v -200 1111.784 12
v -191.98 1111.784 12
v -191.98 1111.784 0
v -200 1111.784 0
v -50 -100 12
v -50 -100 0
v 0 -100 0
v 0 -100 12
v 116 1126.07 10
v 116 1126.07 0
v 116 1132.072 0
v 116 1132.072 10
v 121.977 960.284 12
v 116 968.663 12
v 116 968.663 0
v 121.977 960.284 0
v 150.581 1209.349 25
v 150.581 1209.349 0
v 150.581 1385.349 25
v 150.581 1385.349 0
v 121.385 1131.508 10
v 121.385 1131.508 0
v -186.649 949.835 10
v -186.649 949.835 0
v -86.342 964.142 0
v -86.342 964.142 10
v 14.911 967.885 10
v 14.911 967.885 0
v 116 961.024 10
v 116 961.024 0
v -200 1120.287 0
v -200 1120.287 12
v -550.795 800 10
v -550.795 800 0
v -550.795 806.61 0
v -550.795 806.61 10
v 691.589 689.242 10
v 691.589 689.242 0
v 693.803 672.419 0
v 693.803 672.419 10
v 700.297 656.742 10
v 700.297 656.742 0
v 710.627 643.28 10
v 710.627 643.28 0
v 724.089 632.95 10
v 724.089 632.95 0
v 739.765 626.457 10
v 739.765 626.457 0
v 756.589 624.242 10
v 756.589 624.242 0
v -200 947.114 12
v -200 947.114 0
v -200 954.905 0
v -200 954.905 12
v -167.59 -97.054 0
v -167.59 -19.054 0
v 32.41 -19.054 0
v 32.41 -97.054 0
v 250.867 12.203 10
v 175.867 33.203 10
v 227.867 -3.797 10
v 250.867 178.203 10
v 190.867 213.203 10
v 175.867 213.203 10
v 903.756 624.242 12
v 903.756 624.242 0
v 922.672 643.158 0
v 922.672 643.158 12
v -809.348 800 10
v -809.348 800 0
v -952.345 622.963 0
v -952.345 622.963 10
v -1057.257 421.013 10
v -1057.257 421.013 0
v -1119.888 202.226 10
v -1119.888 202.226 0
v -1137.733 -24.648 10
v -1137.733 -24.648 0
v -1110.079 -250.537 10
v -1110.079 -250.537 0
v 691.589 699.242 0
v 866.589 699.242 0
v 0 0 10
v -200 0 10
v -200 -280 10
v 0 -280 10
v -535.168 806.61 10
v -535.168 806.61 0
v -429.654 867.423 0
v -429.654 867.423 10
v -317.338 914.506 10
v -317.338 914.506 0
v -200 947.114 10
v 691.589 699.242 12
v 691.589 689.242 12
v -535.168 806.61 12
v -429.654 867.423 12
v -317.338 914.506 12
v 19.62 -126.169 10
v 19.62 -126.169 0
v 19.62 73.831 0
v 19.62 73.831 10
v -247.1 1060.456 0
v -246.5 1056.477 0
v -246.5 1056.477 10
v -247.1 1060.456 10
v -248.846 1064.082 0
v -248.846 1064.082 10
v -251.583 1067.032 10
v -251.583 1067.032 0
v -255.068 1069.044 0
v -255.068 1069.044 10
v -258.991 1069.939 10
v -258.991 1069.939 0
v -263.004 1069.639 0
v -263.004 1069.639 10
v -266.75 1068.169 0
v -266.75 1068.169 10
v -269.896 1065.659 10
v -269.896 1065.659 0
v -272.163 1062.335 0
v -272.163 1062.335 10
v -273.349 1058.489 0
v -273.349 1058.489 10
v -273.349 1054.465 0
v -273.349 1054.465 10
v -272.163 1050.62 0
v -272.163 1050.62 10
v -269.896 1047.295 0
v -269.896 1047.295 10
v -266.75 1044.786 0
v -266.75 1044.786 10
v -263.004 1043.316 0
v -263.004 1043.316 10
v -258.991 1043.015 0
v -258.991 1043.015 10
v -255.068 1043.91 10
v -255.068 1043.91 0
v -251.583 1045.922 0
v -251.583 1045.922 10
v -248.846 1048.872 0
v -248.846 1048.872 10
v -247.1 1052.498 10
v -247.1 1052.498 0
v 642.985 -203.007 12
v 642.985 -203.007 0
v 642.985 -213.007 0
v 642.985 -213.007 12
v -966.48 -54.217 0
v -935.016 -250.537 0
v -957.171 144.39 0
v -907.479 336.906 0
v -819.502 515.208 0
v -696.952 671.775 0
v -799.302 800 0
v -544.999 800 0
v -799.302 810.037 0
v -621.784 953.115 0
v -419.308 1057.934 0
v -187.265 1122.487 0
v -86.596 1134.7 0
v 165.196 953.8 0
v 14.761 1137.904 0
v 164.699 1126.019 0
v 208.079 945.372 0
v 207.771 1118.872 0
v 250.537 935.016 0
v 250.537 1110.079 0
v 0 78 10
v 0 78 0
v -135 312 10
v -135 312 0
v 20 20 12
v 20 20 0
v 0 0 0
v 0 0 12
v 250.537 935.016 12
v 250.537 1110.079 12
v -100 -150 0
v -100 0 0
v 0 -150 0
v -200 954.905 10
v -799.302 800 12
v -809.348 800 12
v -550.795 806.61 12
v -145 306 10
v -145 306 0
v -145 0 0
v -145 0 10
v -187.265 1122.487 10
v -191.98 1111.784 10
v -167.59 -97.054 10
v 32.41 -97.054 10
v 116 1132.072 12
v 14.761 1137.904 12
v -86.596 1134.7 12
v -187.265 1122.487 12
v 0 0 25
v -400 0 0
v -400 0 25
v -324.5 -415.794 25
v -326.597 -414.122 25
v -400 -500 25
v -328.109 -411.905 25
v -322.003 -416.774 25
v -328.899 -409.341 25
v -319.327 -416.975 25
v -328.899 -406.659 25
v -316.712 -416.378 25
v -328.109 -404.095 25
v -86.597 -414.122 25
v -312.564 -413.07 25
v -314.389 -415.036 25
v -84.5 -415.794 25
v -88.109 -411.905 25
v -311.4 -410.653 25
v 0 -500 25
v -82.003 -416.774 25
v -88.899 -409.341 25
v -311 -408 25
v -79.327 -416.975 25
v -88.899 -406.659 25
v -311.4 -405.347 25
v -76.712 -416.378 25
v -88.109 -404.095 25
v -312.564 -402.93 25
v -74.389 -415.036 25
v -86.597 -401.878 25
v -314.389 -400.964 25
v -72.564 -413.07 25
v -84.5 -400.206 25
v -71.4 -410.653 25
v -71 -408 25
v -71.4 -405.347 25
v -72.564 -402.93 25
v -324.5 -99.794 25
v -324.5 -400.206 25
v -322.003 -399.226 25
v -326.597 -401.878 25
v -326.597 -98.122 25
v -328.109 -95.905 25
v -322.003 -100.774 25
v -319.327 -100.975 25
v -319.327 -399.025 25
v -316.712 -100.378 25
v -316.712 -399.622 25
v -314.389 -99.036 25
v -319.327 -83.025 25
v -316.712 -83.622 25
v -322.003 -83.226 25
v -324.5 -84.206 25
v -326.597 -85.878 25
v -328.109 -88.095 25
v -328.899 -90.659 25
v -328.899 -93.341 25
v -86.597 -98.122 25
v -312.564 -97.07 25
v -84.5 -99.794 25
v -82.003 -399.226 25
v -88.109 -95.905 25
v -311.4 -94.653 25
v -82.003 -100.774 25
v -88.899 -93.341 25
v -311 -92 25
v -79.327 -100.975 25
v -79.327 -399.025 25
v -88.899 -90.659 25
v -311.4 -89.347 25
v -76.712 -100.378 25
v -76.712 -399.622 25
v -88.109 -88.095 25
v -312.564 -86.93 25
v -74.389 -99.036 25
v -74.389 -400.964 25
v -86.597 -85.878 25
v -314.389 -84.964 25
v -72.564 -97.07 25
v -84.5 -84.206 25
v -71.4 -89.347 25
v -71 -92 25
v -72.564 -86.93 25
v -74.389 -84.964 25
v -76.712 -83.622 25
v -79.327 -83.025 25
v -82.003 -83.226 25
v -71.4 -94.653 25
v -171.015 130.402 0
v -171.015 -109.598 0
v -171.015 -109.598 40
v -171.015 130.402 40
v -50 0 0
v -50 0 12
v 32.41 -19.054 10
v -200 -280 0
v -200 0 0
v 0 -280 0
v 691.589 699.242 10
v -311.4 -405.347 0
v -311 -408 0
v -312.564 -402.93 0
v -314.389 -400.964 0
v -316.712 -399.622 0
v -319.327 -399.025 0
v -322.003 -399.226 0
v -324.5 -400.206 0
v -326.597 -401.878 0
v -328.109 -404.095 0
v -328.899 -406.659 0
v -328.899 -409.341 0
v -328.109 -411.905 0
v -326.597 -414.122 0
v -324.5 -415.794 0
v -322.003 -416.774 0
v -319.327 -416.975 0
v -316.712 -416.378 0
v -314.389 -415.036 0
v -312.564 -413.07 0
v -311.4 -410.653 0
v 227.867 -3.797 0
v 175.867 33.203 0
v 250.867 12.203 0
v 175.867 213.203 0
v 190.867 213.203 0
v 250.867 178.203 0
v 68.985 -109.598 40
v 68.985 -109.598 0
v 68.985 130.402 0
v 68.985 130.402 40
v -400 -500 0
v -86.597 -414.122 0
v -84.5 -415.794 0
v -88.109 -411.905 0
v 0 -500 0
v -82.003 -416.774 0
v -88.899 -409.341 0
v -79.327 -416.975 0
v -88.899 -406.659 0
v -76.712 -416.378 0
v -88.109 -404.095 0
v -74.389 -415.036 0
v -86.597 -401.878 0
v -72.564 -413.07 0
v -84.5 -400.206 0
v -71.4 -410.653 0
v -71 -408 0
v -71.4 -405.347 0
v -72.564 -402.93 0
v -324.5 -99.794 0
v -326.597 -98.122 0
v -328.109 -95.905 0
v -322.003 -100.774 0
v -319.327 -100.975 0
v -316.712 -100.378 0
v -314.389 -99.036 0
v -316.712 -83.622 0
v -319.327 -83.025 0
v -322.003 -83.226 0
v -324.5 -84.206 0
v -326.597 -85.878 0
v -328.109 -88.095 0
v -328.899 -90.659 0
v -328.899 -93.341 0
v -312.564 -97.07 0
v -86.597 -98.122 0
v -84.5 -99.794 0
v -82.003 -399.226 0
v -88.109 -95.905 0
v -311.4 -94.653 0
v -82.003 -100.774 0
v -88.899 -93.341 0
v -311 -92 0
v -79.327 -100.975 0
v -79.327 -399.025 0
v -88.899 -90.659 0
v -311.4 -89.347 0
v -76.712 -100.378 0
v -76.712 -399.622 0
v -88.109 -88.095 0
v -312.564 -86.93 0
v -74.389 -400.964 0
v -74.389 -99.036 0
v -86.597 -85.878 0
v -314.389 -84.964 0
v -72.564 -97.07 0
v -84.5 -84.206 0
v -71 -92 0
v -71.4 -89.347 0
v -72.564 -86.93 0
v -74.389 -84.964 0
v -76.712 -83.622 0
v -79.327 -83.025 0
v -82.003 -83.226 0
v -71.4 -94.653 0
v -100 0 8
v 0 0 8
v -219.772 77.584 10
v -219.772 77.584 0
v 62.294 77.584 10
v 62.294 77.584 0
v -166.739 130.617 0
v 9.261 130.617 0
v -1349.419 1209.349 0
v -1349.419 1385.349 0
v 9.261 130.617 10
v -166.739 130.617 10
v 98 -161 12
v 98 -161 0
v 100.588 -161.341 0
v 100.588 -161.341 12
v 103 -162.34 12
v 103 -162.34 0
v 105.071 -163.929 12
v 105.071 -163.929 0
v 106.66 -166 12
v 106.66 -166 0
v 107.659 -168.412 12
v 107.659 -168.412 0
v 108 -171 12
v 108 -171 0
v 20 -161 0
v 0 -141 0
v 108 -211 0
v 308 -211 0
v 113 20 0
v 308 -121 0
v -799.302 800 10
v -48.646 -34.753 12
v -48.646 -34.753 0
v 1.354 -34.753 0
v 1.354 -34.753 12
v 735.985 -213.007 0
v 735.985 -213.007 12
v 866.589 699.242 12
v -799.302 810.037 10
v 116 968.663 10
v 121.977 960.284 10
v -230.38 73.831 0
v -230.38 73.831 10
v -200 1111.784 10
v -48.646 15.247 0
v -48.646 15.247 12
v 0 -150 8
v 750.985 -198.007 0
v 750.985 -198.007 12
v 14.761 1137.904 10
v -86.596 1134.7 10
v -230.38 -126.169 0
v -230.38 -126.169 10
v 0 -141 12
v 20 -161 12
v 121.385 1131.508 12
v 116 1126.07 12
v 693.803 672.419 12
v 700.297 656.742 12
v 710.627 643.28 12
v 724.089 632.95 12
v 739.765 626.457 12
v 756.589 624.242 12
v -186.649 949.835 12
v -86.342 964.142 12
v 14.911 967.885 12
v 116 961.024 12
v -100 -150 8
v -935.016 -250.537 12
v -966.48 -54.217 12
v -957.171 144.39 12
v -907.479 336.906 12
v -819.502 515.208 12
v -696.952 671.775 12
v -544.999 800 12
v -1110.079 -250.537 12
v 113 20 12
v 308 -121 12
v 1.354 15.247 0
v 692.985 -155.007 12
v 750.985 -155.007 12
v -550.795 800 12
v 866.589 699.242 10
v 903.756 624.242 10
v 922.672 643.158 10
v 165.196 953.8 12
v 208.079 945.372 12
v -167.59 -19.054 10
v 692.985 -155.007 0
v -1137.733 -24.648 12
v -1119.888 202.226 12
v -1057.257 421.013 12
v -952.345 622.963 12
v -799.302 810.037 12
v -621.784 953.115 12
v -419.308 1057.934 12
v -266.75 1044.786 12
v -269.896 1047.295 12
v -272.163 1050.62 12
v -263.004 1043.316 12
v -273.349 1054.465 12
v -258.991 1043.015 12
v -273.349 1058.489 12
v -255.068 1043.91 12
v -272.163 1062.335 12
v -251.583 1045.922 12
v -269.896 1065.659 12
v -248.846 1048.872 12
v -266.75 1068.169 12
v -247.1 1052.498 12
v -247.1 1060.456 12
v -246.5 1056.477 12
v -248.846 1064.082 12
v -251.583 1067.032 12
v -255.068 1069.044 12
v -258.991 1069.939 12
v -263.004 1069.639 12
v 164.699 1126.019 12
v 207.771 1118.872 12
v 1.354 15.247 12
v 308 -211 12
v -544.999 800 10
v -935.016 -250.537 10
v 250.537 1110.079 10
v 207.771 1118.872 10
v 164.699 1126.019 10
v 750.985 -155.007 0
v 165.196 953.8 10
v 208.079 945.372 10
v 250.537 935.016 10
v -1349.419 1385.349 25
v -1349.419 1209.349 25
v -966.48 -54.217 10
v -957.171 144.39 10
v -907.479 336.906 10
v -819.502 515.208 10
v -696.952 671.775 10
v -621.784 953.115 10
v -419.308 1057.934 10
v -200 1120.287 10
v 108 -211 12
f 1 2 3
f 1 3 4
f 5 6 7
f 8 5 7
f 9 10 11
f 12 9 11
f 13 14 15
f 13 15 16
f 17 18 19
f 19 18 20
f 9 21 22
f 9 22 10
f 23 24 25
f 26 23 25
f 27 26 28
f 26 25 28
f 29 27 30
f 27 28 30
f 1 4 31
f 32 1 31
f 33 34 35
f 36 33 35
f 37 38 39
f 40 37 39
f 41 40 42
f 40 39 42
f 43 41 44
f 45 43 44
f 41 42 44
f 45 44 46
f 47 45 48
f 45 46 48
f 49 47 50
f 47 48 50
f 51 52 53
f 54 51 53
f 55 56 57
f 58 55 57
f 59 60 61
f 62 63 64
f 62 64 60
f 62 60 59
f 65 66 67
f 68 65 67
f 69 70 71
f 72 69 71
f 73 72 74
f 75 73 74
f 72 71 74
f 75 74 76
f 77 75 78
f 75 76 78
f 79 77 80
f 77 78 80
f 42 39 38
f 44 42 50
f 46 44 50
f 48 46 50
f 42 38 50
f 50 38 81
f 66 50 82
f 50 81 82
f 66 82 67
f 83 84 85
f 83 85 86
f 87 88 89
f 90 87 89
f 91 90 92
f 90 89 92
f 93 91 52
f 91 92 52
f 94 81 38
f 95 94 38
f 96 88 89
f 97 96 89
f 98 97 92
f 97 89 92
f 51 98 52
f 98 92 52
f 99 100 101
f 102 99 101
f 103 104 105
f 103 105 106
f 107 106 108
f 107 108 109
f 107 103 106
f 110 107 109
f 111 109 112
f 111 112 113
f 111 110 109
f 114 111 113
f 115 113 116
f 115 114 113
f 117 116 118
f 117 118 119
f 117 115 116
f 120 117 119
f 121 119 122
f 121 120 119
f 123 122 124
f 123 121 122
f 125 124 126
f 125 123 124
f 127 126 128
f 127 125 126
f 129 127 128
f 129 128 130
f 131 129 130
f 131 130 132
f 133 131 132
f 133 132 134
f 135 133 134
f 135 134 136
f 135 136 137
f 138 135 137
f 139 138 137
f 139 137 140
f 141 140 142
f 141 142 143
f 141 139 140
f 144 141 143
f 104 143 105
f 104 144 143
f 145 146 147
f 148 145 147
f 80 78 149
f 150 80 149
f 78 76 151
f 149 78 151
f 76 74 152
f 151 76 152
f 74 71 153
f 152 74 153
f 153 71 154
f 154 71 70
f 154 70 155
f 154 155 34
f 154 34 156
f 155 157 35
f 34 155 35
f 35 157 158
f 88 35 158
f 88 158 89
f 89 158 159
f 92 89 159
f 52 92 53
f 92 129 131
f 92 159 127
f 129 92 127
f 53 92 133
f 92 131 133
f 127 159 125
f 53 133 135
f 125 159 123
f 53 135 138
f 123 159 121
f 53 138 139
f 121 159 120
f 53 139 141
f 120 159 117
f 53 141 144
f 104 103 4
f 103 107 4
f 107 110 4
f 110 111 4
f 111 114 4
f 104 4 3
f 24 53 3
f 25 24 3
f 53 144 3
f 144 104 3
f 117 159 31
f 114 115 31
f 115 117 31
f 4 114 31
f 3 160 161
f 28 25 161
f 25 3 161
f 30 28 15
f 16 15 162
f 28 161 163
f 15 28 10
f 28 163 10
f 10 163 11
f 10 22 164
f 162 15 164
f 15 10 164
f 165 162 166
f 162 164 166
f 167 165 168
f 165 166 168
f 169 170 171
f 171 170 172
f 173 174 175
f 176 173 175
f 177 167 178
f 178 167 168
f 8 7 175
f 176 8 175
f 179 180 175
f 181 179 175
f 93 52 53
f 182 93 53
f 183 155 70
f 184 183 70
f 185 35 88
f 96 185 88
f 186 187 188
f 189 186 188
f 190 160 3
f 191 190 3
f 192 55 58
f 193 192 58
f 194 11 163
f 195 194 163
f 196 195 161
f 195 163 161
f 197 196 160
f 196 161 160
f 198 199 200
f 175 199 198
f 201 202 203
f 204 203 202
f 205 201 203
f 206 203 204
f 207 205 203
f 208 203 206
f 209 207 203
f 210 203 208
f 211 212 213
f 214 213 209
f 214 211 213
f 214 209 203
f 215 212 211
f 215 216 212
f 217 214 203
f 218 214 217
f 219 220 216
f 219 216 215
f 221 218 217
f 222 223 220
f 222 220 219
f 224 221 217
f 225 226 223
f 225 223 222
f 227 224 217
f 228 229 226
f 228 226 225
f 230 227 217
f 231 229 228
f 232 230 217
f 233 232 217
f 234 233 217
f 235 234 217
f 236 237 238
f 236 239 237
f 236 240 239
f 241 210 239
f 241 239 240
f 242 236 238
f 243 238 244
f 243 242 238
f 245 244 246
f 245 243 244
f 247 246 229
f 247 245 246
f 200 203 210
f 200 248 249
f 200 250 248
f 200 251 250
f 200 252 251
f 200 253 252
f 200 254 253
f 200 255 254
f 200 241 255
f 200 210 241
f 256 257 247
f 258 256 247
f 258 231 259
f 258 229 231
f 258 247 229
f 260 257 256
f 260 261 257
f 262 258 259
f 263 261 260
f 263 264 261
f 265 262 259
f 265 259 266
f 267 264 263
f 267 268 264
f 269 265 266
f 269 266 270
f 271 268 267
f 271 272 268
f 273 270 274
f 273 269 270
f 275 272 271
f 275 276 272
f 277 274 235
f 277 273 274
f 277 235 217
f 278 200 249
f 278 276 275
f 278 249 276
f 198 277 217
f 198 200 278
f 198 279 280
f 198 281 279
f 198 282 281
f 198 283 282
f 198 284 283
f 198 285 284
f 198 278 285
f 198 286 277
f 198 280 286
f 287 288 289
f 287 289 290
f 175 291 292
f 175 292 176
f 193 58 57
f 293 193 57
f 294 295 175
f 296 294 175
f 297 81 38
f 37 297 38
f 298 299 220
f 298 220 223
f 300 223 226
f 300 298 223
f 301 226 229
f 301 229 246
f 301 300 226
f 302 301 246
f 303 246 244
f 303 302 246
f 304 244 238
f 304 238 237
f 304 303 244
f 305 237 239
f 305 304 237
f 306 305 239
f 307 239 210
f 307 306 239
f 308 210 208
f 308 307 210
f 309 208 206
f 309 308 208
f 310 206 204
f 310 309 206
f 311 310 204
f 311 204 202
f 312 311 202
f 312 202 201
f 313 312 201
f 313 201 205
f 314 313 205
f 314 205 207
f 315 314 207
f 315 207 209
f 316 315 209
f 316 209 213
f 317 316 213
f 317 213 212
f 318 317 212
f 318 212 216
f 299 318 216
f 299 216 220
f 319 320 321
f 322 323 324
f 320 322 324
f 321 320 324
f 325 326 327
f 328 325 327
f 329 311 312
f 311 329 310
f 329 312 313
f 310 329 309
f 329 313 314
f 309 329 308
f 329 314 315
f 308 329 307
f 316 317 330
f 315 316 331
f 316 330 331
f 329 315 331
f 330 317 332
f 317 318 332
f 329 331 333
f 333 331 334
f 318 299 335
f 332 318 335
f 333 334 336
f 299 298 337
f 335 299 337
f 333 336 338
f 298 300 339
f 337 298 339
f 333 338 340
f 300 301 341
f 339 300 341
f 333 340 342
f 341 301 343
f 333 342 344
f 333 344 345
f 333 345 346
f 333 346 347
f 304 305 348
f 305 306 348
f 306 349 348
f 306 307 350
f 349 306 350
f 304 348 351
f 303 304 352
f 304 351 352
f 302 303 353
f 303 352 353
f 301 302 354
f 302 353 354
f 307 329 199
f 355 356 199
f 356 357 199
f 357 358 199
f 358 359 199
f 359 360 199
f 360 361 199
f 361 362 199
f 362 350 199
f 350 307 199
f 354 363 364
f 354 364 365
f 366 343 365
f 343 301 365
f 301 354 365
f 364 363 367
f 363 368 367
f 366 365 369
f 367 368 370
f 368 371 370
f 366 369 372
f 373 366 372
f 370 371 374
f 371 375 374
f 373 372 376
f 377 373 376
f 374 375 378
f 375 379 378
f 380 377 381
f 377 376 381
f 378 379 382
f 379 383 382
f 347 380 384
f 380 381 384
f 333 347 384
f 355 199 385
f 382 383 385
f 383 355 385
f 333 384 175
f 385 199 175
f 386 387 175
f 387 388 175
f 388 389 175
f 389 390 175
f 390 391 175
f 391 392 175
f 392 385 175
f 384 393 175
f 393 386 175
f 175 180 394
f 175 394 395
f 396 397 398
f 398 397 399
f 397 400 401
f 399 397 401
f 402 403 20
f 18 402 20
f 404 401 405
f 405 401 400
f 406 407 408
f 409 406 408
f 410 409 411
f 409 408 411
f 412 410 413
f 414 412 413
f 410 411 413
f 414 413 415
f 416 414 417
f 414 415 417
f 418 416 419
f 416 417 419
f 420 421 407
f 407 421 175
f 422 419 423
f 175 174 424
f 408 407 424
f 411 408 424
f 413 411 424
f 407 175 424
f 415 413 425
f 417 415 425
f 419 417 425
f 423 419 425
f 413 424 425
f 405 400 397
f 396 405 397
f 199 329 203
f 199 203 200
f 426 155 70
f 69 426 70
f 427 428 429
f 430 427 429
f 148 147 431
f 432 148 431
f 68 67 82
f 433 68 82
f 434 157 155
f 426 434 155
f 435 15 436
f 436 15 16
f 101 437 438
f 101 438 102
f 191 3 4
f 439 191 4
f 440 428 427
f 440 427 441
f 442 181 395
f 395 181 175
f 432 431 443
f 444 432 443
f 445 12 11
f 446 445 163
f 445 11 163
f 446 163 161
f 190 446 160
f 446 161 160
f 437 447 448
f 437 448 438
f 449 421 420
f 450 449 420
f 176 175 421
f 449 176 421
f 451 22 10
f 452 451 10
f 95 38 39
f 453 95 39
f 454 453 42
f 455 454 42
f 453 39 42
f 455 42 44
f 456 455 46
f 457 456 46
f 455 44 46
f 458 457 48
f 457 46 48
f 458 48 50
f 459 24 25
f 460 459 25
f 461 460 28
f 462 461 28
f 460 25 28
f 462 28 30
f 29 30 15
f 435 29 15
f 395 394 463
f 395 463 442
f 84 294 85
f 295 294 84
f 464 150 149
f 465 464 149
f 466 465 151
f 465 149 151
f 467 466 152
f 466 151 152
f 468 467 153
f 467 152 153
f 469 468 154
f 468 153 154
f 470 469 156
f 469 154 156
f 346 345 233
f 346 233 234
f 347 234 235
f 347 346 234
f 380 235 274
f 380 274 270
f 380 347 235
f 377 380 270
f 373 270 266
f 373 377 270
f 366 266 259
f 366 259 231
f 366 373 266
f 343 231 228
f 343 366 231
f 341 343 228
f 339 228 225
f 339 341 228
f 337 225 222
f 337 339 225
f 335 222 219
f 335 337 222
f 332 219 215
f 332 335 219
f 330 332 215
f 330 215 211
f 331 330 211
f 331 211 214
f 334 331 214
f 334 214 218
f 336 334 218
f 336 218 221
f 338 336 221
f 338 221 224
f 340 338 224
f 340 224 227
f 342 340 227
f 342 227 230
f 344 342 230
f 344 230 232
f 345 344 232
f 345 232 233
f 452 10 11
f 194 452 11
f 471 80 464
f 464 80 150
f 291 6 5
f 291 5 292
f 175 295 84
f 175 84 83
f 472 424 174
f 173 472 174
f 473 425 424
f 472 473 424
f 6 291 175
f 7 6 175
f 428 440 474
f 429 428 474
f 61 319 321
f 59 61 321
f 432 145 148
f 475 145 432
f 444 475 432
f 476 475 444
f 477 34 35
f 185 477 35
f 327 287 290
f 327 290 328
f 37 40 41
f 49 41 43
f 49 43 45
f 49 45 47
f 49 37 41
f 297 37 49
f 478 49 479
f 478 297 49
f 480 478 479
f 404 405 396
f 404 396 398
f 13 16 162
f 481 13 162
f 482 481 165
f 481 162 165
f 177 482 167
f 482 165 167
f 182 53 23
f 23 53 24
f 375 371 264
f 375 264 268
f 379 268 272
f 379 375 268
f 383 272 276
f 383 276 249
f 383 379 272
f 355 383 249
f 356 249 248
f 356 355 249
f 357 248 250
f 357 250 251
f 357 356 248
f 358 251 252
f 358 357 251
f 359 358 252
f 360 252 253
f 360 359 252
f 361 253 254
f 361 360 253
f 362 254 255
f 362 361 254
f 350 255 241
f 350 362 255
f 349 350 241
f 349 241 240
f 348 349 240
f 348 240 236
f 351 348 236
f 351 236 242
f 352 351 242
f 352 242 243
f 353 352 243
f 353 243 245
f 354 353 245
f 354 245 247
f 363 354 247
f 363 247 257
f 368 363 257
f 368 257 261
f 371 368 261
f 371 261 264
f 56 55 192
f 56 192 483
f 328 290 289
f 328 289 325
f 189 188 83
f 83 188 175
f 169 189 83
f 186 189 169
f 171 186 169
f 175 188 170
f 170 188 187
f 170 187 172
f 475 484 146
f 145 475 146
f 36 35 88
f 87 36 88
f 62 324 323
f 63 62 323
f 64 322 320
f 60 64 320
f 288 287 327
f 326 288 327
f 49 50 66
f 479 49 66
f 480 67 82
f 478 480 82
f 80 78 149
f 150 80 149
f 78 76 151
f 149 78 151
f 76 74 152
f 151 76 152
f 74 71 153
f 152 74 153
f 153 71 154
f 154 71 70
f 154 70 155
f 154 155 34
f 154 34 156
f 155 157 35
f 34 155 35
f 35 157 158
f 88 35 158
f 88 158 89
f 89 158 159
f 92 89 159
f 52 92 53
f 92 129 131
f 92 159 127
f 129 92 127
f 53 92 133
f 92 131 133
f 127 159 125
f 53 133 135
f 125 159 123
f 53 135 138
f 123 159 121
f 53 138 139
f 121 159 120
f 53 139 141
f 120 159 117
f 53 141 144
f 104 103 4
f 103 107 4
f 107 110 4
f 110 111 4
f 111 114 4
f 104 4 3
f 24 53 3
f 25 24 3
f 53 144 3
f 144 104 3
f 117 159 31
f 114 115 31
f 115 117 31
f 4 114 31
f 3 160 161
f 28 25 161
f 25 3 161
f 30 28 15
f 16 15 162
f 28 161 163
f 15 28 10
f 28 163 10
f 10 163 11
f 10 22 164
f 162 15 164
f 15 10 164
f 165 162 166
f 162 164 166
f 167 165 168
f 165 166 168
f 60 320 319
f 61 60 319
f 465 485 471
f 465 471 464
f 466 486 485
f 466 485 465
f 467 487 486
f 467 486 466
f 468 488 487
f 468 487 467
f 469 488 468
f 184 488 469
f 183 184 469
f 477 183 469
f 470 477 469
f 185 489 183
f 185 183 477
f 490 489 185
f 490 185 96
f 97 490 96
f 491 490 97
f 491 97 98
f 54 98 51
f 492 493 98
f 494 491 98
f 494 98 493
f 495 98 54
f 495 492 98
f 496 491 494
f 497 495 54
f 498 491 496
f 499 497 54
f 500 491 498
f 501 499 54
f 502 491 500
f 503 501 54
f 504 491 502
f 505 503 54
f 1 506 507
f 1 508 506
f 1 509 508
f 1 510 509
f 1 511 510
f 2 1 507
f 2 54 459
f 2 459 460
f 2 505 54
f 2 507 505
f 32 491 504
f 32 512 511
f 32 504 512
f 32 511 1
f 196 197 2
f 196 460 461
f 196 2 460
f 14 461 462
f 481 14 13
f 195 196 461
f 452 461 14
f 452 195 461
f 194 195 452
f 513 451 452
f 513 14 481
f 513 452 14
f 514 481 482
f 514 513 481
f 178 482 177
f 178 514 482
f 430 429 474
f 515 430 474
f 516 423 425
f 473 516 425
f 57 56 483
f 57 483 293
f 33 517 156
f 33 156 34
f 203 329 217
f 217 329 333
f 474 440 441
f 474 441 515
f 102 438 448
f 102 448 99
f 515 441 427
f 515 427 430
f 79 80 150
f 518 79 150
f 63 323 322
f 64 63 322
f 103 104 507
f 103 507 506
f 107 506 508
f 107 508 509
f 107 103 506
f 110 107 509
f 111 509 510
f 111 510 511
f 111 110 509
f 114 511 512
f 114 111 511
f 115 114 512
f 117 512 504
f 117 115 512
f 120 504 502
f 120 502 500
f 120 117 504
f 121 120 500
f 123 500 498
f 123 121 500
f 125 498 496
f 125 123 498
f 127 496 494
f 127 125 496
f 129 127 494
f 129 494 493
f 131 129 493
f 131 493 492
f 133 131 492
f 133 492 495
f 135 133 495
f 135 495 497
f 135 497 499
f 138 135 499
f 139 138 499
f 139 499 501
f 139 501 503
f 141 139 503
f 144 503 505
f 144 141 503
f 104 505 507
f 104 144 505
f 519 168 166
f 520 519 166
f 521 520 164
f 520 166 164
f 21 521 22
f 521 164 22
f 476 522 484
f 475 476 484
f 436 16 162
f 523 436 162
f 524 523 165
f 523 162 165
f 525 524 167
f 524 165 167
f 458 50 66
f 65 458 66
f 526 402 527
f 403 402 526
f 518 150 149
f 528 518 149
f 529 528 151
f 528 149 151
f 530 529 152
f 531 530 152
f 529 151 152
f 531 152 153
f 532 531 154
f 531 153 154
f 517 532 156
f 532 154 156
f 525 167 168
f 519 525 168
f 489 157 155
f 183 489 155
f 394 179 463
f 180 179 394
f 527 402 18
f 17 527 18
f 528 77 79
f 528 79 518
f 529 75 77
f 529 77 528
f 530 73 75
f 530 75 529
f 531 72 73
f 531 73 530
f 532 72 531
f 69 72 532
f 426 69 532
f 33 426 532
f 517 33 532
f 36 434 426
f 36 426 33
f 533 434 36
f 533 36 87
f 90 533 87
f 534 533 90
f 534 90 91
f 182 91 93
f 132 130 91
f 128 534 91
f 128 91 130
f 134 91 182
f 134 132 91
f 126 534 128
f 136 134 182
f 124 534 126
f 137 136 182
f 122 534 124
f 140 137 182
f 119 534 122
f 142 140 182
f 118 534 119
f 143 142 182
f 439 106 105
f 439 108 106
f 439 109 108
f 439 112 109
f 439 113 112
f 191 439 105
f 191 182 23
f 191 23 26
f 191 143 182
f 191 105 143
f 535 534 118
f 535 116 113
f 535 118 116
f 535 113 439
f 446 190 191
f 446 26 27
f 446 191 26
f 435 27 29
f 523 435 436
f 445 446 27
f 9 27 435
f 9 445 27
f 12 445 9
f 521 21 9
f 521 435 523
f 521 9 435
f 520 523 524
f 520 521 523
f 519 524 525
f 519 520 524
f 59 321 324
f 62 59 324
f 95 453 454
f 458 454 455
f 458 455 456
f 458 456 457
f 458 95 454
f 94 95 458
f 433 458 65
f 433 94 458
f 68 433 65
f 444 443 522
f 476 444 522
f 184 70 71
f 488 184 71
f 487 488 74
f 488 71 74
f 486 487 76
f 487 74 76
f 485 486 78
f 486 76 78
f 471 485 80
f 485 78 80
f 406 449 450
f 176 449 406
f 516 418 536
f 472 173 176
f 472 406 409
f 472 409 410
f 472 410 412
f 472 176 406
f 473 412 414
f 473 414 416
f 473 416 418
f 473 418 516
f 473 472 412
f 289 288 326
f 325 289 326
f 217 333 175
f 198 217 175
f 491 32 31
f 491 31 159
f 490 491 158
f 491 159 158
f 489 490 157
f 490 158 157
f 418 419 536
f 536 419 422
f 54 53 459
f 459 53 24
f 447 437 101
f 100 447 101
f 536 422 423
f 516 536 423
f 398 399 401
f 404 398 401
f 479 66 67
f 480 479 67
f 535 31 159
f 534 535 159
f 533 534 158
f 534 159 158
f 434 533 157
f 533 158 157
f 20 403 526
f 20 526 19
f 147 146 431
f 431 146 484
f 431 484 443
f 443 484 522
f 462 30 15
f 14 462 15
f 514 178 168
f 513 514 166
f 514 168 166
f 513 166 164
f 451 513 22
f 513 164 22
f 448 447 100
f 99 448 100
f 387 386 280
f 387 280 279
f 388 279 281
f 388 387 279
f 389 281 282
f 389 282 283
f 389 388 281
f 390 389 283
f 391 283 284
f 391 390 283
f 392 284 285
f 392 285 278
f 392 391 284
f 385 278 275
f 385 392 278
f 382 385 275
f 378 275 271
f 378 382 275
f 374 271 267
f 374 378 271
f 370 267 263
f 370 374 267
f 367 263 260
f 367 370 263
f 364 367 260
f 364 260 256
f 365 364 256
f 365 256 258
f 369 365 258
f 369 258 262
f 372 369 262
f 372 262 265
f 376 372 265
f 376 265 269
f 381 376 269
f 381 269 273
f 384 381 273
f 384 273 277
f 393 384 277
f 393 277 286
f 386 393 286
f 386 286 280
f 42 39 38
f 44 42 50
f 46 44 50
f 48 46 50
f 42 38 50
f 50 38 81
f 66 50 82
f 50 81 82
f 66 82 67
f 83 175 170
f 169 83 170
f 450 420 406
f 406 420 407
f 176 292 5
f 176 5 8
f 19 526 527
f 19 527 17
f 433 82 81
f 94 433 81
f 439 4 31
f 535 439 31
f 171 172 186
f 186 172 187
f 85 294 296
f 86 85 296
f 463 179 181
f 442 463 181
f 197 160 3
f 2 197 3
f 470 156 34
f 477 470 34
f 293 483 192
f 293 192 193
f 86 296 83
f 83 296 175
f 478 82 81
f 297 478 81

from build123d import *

# Parameters (mm, degrees)
F0_R      = 13.5
F1_DEPTH  = 12
F3_DEPTH  = 10
F5_DEPTH  = 10
F6_DEPTH  = 10
F7_W      = 1500
F7_H      = 176
F8_DEPTH  = 12
F9_DEPTH  = 25
F11_DEPTH = 12
F12_W     = 400
F12_H     = 500
F12_R     = 9
F13_DEPTH = 16
F14_DEPTH = 25
F16_DEPTH = 12
F17_W     = 100
F17_H     = 150
F18_DEPTH = 8
F19_W     = 50
F19_H     = 100
F20_DEPTH = 12
F21_W     = 50
F21_H     = 50
F22_DEPTH = 12
F23_W     = 240
F23_H     = 240
F24_DEPTH = 40
F26_DEPTH = 10
F27_W     = 200
F27_H     = 280
F28_DEPTH = 10
F29_W     = 200
F29_H     = 78
F30_DEPTH = 10
F31_W     = 250
F31_H     = 200
F32_DEPTH = 10


with BuildPart() as f1:
    # F0 (on Top) → F1 (new body)
    with BuildSketch(Plane.XY):
        with BuildLine():
            ThreePointArc((121.977138, 960.284113), (186.68498, 949.827731), (250.536836, 935.0162))
            Line((250.536836, 935.0162), (250.536836, 1110.078958))
            ThreePointArc((250.536836, 1110.078958), (186.269532, 1122.652066), (121.385421, 1131.507658))
            Line((121.385421, 1131.507658), (116, 1126.069903))
            Line((116, 1126.069903), (116, 1132.072436))
            ThreePointArc((116, 1132.072436), (-35.953178, 1137.431918), (-187.264538, 1122.486522))
            Line((-187.264538, 1122.486522), (-191.9799, 1111.783504))
            Line((-191.9799, 1111.783504), (-200, 1111.783504))
            Line((-200, 1111.783504), (-200, 1120.287463))
            ThreePointArc((-200, 1120.287463), (-523.177706, 1010.608276), (-799.301982, 810.037247))
            Line((-799.301982, 810.037247), (-799.301982, 800))
            Line((-799.301982, 800), (-809.347886, 800))
            ThreePointArc((-809.347886, 800), (-1094.055192, 313.18882), (-1110.078958, -250.536836))
            Line((-1110.078958, -250.536836), (-935.0162, -250.536836))
            ThreePointArc((-935.0162, -250.536836), (-907.479046, 336.906189), (-544.999083, 800))
            Line((-544.999083, 800), (-550.795078, 800))
            Line((-550.795078, 800), (-550.795078, 806.609631))
            Line((-550.795078, 806.609631), (-535.168108, 806.609631))
            ThreePointArc((-535.168108, 806.609631), (-374.237053, 892.732114), (-200, 947.11351))
            Line((-200, 947.11351), (-200, 954.904914))
            Line((-200, 954.904914), (-186.648764, 949.834848))
            ThreePointArc((-186.648764, 949.834848), (-35.7647, 967.339075), (116, 961.024453))
            Line((116, 961.024453), (116, 968.662679))
            Line((116, 968.662679), (121.977138, 960.284113))
        make_face()
        with Locations((-260, 1056.477165)):
            Circle(F0_R, mode=Mode.SUBTRACT)
        with BuildLine():
            Line((866.588652, 699.241817), (691.588652, 699.241817))
            Line((691.588652, 699.241817), (691.588652, 689.241817))
            ThreePointArc((691.588652, 689.241817), (710.626711, 643.279876), (756.588652, 624.241817))
            Line((756.588652, 624.241817), (866.588652, 624.241817))
            Line((866.588652, 624.241817), (866.588652, 699.241817))
        make_face()
        Polygon((922.67248, 643.157989), (866.588652, 699.241817), (866.588652, 624.241817), (903.756309, 624.241817), align=None)
    extrude(amount=F1_DEPTH)


with BuildPart() as f3:
    # F2 (on Top) → F3 (new body)
    with BuildSketch(Plane.XY):
        Polygon((190.86661, 213.203065), (175.86661, 213.203065), (175.86661, 33.203065), (227.86661, -3.796935), (250.86661, 12.203065), (250.86661, 178.203065), align=None)
    extrude(amount=F3_DEPTH)


with BuildPart() as f5:
    # F4 (on Top) → F5 (new body)
    with BuildSketch(Plane.XY):
        Polygon((9.26071, 130.616721), (-166.73929, 130.616721), (-219.772298, 77.583712), (62.293719, 77.583712), align=None)
    extrude(amount=F5_DEPTH)


with BuildPart() as f6:
    # F0 (on Top) → F6 (new body)
    with BuildSketch(Plane.XY):
        with BuildLine():
            ThreePointArc((121.977138, 960.284113), (186.68498, 949.827731), (250.536836, 935.0162))
            Line((250.536836, 935.0162), (250.536836, 1110.078958))
            ThreePointArc((250.536836, 1110.078958), (186.269532, 1122.652066), (121.385421, 1131.507658))
            Line((121.385421, 1131.507658), (116, 1126.069903))
            Line((116, 1126.069903), (116, 1132.072436))
            ThreePointArc((116, 1132.072436), (-35.953178, 1137.431918), (-187.264538, 1122.486522))
            Line((-187.264538, 1122.486522), (-191.9799, 1111.783504))
            Line((-191.9799, 1111.783504), (-200, 1111.783504))
            Line((-200, 1111.783504), (-200, 1120.287463))
            ThreePointArc((-200, 1120.287463), (-523.177706, 1010.608276), (-799.301982, 810.037247))
            Line((-799.301982, 810.037247), (-799.301982, 800))
            Line((-799.301982, 800), (-809.347886, 800))
            ThreePointArc((-809.347886, 800), (-1094.055192, 313.18882), (-1110.078958, -250.536836))
            Line((-1110.078958, -250.536836), (-935.0162, -250.536836))
            ThreePointArc((-935.0162, -250.536836), (-907.479046, 336.906189), (-544.999083, 800))
            Line((-544.999083, 800), (-550.795078, 800))
            Line((-550.795078, 800), (-550.795078, 806.609631))
            Line((-550.795078, 806.609631), (-535.168108, 806.609631))
            ThreePointArc((-535.168108, 806.609631), (-374.237053, 892.732114), (-200, 947.11351))
            Line((-200, 947.11351), (-200, 954.904914))
            Line((-200, 954.904914), (-186.648764, 949.834848))
            ThreePointArc((-186.648764, 949.834848), (-35.7647, 967.339075), (116, 961.024453))
            Line((116, 961.024453), (116, 968.662679))
            Line((116, 968.662679), (121.977138, 960.284113))
        make_face()
        with Locations((-260, 1056.477165)):
            Circle(F0_R, mode=Mode.SUBTRACT)
        with BuildLine():
            Line((866.588652, 699.241817), (691.588652, 699.241817))
            Line((691.588652, 699.241817), (691.588652, 689.241817))
            ThreePointArc((691.588652, 689.241817), (710.626711, 643.279876), (756.588652, 624.241817))
            Line((756.588652, 624.241817), (866.588652, 624.241817))
            Line((866.588652, 624.241817), (866.588652, 699.241817))
        make_face()
        Polygon((922.67248, 643.157989), (866.588652, 699.241817), (866.588652, 624.241817), (903.756309, 624.241817), align=None)
    extrude(amount=F6_DEPTH)


with BuildPart() as f8:
    # F7 (on Top) → F8 (new body)
    with BuildSketch(Plane.XY):
        with Locations((-599.419415, 1297.348561)):
            Rectangle(F7_W, F7_H)
    extrude(amount=F8_DEPTH)

    # F7 (on Top) → F9 (join)
    with BuildSketch(Plane.XY):
        with Locations((-599.419415, 1297.348561)):
            Rectangle(F7_W, F7_H)
    extrude(amount=F9_DEPTH)


with BuildPart() as f11:
    # F10 (on Top) → F11 (new body)
    with BuildSketch(Plane.XY):
        Polygon((750.985089, -198.006836), (750.985089, -155.006836), (692.985089, -155.006836), (642.985089, -203.006836), (642.985089, -213.006836), (735.985089, -213.006836), align=None)
    extrude(amount=F11_DEPTH)


with BuildPart() as f13:
    # F12 (on Top) → F13 (new body)
    with BuildSketch(Plane.XY):
        with Locations((-200, -250)):
            Rectangle(F12_W, F12_H)
        with Locations((-320, -408)):
            Circle(F12_R, mode=Mode.SUBTRACT)
        with Locations((-80, -408)):
            Circle(F12_R, mode=Mode.SUBTRACT)
        with Locations((-320, -92)):
            Circle(F12_R, mode=Mode.SUBTRACT)
        with Locations((-80, -92)):
            Circle(F12_R, mode=Mode.SUBTRACT)
    extrude(amount=F13_DEPTH)

    # F12 (on Top) → F14 (join)
    with BuildSketch(Plane.XY):
        with Locations((-200, -250)):
            Rectangle(F12_W, F12_H)
        with Locations((-320, -408)):
            Circle(F12_R, mode=Mode.SUBTRACT)
        with Locations((-80, -408)):
            Circle(F12_R, mode=Mode.SUBTRACT)
        with Locations((-320, -92)):
            Circle(F12_R, mode=Mode.SUBTRACT)
        with Locations((-80, -92)):
            Circle(F12_R, mode=Mode.SUBTRACT)
    extrude(amount=F14_DEPTH)


with BuildPart() as f16:
    # F15 (on Top) → F16 (new body)
    with BuildSketch(Plane.XY):
        with BuildLine():
            Line((20, 20), (0, 0))
            Line((0, 0), (0, -141))
            Line((0, -141), (20, -161))
            Line((20, -161), (98, -161))
            ThreePointArc((98, -161), (105.071068, -163.928932), (108, -171))
            Line((108, -171), (108, -211))
            Line((108, -211), (308, -211))
            Line((308, -211), (308, -121))
            Line((308, -121), (113, 20))
            Line((113, 20), (20, 20))
        make_face()
    extrude(amount=F16_DEPTH)


with BuildPart() as f18:
    # F17 (on Top) → F18 (new body)
    with BuildSketch(Plane.XY):
        with Locations((-50, -75)):
            Rectangle(F17_W, F17_H)
    extrude(amount=F18_DEPTH)


with BuildPart() as f20:
    # F19 (on Top) → F20 (new body)
    with BuildSketch(Plane.XY):
        with Locations((-25, -50)):
            Rectangle(F19_W, F19_H)
    extrude(amount=F20_DEPTH)


with BuildPart() as f22:
    # F21 (on Top) → F22 (new body)
    with BuildSketch(Plane.XY):
        with Locations((-23.646096, -9.75335)):
            Rectangle(F21_W, F21_H)
    extrude(amount=F22_DEPTH)


with BuildPart() as f24:
    # F23 (on Top) → F24 (new body)
    with BuildSketch(Plane.XY):
        with Locations((-51.015153, 10.401622)):
            Rectangle(F23_W, F23_H)
    extrude(amount=F24_DEPTH)


with BuildPart() as f26:
    # F25 (on Top) → F26 (new body)
    with BuildSketch(Plane.XY):
        Polygon((-145, 0), (0, 0), (0, 78), (-135, 312), (-145, 306), align=None)
    extrude(amount=F26_DEPTH)


with BuildPart() as f28:
    # F27 (on Top) → F28 (new body)
    with BuildSketch(Plane.XY):
        with Locations((-100, -140)):
            Rectangle(F27_W, F27_H)
    extrude(amount=F28_DEPTH)


with BuildPart() as f30:
    # F29 (on Top) → F30 (new body)
    with BuildSketch(Plane.XY):
        with Locations((-67.590301, -58.054473)):
            Rectangle(F29_W, F29_H)
    extrude(amount=F30_DEPTH)


with BuildPart() as f32:
    # F31 (on Top) → F32 (new body)
    with BuildSketch(Plane.XY):
        with Locations((-105.379999, -26.168635)):
            Rectangle(F31_W, F31_H)
    extrude(amount=F32_DEPTH)


solid = Compound([f1.part, f3.part, f5.part, f6.part, f8.part, f11.part, f13.part, f16.part, f18.part, f20.part, f22.part, f24.part, f26.part, f28.part, f30.part, f32.part])
